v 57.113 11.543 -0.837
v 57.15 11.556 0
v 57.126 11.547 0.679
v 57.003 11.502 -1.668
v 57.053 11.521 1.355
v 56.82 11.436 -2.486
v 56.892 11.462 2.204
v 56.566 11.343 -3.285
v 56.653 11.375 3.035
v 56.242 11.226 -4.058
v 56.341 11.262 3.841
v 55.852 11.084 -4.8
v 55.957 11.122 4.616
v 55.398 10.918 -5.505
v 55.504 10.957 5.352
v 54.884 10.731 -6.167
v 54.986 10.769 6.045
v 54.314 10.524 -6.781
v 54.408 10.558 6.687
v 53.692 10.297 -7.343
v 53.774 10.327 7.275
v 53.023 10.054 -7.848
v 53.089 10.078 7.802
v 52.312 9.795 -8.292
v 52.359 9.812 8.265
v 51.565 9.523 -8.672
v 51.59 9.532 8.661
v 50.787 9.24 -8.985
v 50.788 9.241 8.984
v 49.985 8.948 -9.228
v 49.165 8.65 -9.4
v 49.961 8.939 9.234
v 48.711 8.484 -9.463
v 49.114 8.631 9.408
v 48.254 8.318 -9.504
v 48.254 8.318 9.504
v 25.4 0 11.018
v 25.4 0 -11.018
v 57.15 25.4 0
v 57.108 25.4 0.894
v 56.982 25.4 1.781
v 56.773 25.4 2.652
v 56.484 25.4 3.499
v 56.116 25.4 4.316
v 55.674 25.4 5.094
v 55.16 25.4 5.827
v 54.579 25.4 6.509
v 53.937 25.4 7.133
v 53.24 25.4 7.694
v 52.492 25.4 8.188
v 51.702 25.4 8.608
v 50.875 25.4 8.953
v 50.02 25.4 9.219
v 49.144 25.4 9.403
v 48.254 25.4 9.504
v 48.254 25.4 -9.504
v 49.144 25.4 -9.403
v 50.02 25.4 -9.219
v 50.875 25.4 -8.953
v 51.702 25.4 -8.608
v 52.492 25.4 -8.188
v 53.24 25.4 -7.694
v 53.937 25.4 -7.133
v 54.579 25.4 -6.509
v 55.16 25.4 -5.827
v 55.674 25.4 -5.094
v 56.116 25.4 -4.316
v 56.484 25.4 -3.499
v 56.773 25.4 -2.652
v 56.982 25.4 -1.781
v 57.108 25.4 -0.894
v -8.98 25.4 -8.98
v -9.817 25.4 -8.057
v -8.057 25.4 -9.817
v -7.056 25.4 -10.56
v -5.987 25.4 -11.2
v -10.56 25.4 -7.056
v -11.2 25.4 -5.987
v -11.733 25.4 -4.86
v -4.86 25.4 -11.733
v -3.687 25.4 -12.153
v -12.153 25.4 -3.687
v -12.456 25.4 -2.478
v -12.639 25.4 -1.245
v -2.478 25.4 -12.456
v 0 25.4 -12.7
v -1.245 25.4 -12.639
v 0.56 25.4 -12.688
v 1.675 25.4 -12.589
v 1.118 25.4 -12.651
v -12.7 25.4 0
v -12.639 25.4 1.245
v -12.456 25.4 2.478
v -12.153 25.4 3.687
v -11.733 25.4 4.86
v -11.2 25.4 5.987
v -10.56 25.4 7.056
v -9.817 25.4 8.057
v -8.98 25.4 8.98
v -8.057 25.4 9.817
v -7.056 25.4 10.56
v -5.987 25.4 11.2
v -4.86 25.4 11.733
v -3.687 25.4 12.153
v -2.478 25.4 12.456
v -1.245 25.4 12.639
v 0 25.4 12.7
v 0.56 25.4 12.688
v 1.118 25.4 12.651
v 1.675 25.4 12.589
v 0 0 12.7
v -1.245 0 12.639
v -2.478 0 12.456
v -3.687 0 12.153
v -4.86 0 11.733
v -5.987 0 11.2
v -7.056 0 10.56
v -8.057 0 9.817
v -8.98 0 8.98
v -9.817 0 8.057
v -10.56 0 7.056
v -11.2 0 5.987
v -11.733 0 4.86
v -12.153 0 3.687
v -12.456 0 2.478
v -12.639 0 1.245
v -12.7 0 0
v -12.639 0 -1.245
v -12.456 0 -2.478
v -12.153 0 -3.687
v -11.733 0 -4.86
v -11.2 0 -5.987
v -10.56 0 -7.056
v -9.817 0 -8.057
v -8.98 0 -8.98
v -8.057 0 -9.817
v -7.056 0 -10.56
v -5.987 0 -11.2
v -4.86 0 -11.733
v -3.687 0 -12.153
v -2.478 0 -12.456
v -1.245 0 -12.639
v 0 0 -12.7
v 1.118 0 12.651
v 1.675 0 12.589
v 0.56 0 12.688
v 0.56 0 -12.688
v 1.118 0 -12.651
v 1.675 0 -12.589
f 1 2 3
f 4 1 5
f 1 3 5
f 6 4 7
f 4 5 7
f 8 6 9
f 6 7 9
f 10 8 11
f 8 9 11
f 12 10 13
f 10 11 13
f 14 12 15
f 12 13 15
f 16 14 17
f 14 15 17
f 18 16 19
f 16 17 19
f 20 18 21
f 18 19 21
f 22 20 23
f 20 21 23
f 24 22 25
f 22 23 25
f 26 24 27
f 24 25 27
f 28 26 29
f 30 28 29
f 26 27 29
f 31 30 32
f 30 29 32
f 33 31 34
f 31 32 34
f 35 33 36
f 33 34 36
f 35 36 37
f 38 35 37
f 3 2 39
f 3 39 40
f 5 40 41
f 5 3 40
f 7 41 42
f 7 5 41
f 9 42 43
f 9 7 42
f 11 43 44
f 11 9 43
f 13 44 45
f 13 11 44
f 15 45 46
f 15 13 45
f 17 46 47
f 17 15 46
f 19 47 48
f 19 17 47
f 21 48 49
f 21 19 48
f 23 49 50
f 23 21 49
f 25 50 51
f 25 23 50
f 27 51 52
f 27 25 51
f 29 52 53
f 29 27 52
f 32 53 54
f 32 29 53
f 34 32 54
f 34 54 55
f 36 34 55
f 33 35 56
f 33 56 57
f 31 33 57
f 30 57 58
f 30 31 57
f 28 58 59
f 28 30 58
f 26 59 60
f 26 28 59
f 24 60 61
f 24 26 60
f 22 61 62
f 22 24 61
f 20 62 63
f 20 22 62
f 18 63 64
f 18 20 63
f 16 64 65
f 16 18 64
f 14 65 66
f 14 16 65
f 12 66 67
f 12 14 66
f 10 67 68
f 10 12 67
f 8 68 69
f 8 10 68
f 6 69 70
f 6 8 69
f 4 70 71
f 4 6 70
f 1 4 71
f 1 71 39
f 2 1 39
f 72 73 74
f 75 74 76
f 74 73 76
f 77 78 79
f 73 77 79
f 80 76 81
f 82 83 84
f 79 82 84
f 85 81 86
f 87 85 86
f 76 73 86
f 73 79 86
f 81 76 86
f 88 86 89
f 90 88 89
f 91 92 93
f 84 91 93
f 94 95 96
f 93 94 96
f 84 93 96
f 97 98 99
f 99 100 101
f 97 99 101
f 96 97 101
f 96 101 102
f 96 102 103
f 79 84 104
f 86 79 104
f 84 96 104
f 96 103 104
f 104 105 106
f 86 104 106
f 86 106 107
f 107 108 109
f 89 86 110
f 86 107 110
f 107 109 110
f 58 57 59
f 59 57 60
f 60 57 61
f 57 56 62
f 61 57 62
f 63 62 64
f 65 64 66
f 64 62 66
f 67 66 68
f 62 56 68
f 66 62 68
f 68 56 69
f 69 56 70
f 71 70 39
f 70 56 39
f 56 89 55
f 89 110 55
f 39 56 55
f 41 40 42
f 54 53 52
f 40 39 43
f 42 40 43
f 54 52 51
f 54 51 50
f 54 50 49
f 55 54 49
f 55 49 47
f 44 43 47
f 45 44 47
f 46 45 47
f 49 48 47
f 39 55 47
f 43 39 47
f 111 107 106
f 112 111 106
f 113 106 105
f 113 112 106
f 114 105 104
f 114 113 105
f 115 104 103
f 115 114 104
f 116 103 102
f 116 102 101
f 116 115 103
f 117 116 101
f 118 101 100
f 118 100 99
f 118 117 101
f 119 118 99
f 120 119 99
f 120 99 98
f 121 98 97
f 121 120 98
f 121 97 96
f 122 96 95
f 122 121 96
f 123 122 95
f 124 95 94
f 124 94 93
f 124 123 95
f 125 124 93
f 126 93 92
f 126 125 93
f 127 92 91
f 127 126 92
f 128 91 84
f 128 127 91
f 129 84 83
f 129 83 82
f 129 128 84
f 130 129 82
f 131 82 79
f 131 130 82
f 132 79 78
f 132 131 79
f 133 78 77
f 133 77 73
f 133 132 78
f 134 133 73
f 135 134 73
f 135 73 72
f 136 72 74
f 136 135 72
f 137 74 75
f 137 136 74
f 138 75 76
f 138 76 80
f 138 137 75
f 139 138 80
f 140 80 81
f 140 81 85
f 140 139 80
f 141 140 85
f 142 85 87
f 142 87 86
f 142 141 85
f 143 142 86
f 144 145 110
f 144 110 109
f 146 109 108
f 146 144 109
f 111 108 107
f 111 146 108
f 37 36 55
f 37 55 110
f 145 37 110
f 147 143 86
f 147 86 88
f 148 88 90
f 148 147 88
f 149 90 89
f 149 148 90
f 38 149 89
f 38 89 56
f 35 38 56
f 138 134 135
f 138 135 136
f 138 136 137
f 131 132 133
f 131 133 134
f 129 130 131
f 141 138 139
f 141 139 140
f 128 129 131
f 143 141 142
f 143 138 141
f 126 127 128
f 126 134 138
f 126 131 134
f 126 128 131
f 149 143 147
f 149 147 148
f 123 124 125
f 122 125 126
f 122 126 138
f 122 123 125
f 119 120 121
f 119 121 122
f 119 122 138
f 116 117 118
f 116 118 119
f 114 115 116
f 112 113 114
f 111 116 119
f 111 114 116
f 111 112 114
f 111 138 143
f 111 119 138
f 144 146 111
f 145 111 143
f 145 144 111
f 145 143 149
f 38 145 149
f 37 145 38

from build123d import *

# Parameters (mm, degrees)
F1_DEPTH = 25.4
F3_DEPTH = 12.7


with BuildPart() as f1:
    # F0 (on Front) → F1 (new body)
    with BuildSketch(Plane.XZ):
        with BuildLine():
            Line((1.674858, 12.589077), (0, 12.7))
            ThreePointArc((0, 12.7), (-12.7, 0), (0, -12.7))
            Line((0, -12.7), (1.674858, -12.589077))
            ThreePointArc((1.674858, -12.589077), (9.554075, -8.367177), (12.7, 0))
            ThreePointArc((12.7, 0), (9.554075, 8.367177), (1.674858, 12.589077))
        make_face()
        with BuildLine():
            ThreePointArc((1.674858, 12.589077), (0.839264, 12.672239), (0, 12.7))
            Line((0, 12.7), (1.674858, 12.589077))
        make_face()
        with BuildLine():
            Line((1.674858, -12.589077), (0, -12.7))
            ThreePointArc((0, -12.7), (0.839264, -12.672239), (1.674858, -12.589077))
        make_face()
        with BuildLine():
            Line((48.254448, 9.504179), (1.674858, 12.589077))
            ThreePointArc((1.674858, 12.589077), (9.554075, 8.367177), (12.7, 0))
            ThreePointArc((12.7, 0), (9.554075, -8.367177), (1.674858, -12.589077))
            Line((1.674858, -12.589077), (48.254448, -9.504179))
            ThreePointArc((48.254448, -9.504179), (38.1, 0), (48.254448, 9.504179))
        make_face()
        with BuildLine():
            ThreePointArc((57.15, 0), (54.579176, 6.508845), (48.254448, 9.504179))
            ThreePointArc((48.254448, 9.504179), (38.1, 0), (48.254448, -9.504179))
            ThreePointArc((48.254448, -9.504179), (54.579176, -6.508845), (57.15, 0))
        make_face()
    extrude(amount=-F1_DEPTH)

    # F2 (on Top) → F3 (cut, symmetric)
    with BuildSketch(Plane.XY):
        Polygon((25.4, 0), (57.15, 0), (57.15, 11.556055), align=None)
    extrude(amount=F3_DEPTH, both=True, mode=Mode.SUBTRACT)


solid = f1.part
